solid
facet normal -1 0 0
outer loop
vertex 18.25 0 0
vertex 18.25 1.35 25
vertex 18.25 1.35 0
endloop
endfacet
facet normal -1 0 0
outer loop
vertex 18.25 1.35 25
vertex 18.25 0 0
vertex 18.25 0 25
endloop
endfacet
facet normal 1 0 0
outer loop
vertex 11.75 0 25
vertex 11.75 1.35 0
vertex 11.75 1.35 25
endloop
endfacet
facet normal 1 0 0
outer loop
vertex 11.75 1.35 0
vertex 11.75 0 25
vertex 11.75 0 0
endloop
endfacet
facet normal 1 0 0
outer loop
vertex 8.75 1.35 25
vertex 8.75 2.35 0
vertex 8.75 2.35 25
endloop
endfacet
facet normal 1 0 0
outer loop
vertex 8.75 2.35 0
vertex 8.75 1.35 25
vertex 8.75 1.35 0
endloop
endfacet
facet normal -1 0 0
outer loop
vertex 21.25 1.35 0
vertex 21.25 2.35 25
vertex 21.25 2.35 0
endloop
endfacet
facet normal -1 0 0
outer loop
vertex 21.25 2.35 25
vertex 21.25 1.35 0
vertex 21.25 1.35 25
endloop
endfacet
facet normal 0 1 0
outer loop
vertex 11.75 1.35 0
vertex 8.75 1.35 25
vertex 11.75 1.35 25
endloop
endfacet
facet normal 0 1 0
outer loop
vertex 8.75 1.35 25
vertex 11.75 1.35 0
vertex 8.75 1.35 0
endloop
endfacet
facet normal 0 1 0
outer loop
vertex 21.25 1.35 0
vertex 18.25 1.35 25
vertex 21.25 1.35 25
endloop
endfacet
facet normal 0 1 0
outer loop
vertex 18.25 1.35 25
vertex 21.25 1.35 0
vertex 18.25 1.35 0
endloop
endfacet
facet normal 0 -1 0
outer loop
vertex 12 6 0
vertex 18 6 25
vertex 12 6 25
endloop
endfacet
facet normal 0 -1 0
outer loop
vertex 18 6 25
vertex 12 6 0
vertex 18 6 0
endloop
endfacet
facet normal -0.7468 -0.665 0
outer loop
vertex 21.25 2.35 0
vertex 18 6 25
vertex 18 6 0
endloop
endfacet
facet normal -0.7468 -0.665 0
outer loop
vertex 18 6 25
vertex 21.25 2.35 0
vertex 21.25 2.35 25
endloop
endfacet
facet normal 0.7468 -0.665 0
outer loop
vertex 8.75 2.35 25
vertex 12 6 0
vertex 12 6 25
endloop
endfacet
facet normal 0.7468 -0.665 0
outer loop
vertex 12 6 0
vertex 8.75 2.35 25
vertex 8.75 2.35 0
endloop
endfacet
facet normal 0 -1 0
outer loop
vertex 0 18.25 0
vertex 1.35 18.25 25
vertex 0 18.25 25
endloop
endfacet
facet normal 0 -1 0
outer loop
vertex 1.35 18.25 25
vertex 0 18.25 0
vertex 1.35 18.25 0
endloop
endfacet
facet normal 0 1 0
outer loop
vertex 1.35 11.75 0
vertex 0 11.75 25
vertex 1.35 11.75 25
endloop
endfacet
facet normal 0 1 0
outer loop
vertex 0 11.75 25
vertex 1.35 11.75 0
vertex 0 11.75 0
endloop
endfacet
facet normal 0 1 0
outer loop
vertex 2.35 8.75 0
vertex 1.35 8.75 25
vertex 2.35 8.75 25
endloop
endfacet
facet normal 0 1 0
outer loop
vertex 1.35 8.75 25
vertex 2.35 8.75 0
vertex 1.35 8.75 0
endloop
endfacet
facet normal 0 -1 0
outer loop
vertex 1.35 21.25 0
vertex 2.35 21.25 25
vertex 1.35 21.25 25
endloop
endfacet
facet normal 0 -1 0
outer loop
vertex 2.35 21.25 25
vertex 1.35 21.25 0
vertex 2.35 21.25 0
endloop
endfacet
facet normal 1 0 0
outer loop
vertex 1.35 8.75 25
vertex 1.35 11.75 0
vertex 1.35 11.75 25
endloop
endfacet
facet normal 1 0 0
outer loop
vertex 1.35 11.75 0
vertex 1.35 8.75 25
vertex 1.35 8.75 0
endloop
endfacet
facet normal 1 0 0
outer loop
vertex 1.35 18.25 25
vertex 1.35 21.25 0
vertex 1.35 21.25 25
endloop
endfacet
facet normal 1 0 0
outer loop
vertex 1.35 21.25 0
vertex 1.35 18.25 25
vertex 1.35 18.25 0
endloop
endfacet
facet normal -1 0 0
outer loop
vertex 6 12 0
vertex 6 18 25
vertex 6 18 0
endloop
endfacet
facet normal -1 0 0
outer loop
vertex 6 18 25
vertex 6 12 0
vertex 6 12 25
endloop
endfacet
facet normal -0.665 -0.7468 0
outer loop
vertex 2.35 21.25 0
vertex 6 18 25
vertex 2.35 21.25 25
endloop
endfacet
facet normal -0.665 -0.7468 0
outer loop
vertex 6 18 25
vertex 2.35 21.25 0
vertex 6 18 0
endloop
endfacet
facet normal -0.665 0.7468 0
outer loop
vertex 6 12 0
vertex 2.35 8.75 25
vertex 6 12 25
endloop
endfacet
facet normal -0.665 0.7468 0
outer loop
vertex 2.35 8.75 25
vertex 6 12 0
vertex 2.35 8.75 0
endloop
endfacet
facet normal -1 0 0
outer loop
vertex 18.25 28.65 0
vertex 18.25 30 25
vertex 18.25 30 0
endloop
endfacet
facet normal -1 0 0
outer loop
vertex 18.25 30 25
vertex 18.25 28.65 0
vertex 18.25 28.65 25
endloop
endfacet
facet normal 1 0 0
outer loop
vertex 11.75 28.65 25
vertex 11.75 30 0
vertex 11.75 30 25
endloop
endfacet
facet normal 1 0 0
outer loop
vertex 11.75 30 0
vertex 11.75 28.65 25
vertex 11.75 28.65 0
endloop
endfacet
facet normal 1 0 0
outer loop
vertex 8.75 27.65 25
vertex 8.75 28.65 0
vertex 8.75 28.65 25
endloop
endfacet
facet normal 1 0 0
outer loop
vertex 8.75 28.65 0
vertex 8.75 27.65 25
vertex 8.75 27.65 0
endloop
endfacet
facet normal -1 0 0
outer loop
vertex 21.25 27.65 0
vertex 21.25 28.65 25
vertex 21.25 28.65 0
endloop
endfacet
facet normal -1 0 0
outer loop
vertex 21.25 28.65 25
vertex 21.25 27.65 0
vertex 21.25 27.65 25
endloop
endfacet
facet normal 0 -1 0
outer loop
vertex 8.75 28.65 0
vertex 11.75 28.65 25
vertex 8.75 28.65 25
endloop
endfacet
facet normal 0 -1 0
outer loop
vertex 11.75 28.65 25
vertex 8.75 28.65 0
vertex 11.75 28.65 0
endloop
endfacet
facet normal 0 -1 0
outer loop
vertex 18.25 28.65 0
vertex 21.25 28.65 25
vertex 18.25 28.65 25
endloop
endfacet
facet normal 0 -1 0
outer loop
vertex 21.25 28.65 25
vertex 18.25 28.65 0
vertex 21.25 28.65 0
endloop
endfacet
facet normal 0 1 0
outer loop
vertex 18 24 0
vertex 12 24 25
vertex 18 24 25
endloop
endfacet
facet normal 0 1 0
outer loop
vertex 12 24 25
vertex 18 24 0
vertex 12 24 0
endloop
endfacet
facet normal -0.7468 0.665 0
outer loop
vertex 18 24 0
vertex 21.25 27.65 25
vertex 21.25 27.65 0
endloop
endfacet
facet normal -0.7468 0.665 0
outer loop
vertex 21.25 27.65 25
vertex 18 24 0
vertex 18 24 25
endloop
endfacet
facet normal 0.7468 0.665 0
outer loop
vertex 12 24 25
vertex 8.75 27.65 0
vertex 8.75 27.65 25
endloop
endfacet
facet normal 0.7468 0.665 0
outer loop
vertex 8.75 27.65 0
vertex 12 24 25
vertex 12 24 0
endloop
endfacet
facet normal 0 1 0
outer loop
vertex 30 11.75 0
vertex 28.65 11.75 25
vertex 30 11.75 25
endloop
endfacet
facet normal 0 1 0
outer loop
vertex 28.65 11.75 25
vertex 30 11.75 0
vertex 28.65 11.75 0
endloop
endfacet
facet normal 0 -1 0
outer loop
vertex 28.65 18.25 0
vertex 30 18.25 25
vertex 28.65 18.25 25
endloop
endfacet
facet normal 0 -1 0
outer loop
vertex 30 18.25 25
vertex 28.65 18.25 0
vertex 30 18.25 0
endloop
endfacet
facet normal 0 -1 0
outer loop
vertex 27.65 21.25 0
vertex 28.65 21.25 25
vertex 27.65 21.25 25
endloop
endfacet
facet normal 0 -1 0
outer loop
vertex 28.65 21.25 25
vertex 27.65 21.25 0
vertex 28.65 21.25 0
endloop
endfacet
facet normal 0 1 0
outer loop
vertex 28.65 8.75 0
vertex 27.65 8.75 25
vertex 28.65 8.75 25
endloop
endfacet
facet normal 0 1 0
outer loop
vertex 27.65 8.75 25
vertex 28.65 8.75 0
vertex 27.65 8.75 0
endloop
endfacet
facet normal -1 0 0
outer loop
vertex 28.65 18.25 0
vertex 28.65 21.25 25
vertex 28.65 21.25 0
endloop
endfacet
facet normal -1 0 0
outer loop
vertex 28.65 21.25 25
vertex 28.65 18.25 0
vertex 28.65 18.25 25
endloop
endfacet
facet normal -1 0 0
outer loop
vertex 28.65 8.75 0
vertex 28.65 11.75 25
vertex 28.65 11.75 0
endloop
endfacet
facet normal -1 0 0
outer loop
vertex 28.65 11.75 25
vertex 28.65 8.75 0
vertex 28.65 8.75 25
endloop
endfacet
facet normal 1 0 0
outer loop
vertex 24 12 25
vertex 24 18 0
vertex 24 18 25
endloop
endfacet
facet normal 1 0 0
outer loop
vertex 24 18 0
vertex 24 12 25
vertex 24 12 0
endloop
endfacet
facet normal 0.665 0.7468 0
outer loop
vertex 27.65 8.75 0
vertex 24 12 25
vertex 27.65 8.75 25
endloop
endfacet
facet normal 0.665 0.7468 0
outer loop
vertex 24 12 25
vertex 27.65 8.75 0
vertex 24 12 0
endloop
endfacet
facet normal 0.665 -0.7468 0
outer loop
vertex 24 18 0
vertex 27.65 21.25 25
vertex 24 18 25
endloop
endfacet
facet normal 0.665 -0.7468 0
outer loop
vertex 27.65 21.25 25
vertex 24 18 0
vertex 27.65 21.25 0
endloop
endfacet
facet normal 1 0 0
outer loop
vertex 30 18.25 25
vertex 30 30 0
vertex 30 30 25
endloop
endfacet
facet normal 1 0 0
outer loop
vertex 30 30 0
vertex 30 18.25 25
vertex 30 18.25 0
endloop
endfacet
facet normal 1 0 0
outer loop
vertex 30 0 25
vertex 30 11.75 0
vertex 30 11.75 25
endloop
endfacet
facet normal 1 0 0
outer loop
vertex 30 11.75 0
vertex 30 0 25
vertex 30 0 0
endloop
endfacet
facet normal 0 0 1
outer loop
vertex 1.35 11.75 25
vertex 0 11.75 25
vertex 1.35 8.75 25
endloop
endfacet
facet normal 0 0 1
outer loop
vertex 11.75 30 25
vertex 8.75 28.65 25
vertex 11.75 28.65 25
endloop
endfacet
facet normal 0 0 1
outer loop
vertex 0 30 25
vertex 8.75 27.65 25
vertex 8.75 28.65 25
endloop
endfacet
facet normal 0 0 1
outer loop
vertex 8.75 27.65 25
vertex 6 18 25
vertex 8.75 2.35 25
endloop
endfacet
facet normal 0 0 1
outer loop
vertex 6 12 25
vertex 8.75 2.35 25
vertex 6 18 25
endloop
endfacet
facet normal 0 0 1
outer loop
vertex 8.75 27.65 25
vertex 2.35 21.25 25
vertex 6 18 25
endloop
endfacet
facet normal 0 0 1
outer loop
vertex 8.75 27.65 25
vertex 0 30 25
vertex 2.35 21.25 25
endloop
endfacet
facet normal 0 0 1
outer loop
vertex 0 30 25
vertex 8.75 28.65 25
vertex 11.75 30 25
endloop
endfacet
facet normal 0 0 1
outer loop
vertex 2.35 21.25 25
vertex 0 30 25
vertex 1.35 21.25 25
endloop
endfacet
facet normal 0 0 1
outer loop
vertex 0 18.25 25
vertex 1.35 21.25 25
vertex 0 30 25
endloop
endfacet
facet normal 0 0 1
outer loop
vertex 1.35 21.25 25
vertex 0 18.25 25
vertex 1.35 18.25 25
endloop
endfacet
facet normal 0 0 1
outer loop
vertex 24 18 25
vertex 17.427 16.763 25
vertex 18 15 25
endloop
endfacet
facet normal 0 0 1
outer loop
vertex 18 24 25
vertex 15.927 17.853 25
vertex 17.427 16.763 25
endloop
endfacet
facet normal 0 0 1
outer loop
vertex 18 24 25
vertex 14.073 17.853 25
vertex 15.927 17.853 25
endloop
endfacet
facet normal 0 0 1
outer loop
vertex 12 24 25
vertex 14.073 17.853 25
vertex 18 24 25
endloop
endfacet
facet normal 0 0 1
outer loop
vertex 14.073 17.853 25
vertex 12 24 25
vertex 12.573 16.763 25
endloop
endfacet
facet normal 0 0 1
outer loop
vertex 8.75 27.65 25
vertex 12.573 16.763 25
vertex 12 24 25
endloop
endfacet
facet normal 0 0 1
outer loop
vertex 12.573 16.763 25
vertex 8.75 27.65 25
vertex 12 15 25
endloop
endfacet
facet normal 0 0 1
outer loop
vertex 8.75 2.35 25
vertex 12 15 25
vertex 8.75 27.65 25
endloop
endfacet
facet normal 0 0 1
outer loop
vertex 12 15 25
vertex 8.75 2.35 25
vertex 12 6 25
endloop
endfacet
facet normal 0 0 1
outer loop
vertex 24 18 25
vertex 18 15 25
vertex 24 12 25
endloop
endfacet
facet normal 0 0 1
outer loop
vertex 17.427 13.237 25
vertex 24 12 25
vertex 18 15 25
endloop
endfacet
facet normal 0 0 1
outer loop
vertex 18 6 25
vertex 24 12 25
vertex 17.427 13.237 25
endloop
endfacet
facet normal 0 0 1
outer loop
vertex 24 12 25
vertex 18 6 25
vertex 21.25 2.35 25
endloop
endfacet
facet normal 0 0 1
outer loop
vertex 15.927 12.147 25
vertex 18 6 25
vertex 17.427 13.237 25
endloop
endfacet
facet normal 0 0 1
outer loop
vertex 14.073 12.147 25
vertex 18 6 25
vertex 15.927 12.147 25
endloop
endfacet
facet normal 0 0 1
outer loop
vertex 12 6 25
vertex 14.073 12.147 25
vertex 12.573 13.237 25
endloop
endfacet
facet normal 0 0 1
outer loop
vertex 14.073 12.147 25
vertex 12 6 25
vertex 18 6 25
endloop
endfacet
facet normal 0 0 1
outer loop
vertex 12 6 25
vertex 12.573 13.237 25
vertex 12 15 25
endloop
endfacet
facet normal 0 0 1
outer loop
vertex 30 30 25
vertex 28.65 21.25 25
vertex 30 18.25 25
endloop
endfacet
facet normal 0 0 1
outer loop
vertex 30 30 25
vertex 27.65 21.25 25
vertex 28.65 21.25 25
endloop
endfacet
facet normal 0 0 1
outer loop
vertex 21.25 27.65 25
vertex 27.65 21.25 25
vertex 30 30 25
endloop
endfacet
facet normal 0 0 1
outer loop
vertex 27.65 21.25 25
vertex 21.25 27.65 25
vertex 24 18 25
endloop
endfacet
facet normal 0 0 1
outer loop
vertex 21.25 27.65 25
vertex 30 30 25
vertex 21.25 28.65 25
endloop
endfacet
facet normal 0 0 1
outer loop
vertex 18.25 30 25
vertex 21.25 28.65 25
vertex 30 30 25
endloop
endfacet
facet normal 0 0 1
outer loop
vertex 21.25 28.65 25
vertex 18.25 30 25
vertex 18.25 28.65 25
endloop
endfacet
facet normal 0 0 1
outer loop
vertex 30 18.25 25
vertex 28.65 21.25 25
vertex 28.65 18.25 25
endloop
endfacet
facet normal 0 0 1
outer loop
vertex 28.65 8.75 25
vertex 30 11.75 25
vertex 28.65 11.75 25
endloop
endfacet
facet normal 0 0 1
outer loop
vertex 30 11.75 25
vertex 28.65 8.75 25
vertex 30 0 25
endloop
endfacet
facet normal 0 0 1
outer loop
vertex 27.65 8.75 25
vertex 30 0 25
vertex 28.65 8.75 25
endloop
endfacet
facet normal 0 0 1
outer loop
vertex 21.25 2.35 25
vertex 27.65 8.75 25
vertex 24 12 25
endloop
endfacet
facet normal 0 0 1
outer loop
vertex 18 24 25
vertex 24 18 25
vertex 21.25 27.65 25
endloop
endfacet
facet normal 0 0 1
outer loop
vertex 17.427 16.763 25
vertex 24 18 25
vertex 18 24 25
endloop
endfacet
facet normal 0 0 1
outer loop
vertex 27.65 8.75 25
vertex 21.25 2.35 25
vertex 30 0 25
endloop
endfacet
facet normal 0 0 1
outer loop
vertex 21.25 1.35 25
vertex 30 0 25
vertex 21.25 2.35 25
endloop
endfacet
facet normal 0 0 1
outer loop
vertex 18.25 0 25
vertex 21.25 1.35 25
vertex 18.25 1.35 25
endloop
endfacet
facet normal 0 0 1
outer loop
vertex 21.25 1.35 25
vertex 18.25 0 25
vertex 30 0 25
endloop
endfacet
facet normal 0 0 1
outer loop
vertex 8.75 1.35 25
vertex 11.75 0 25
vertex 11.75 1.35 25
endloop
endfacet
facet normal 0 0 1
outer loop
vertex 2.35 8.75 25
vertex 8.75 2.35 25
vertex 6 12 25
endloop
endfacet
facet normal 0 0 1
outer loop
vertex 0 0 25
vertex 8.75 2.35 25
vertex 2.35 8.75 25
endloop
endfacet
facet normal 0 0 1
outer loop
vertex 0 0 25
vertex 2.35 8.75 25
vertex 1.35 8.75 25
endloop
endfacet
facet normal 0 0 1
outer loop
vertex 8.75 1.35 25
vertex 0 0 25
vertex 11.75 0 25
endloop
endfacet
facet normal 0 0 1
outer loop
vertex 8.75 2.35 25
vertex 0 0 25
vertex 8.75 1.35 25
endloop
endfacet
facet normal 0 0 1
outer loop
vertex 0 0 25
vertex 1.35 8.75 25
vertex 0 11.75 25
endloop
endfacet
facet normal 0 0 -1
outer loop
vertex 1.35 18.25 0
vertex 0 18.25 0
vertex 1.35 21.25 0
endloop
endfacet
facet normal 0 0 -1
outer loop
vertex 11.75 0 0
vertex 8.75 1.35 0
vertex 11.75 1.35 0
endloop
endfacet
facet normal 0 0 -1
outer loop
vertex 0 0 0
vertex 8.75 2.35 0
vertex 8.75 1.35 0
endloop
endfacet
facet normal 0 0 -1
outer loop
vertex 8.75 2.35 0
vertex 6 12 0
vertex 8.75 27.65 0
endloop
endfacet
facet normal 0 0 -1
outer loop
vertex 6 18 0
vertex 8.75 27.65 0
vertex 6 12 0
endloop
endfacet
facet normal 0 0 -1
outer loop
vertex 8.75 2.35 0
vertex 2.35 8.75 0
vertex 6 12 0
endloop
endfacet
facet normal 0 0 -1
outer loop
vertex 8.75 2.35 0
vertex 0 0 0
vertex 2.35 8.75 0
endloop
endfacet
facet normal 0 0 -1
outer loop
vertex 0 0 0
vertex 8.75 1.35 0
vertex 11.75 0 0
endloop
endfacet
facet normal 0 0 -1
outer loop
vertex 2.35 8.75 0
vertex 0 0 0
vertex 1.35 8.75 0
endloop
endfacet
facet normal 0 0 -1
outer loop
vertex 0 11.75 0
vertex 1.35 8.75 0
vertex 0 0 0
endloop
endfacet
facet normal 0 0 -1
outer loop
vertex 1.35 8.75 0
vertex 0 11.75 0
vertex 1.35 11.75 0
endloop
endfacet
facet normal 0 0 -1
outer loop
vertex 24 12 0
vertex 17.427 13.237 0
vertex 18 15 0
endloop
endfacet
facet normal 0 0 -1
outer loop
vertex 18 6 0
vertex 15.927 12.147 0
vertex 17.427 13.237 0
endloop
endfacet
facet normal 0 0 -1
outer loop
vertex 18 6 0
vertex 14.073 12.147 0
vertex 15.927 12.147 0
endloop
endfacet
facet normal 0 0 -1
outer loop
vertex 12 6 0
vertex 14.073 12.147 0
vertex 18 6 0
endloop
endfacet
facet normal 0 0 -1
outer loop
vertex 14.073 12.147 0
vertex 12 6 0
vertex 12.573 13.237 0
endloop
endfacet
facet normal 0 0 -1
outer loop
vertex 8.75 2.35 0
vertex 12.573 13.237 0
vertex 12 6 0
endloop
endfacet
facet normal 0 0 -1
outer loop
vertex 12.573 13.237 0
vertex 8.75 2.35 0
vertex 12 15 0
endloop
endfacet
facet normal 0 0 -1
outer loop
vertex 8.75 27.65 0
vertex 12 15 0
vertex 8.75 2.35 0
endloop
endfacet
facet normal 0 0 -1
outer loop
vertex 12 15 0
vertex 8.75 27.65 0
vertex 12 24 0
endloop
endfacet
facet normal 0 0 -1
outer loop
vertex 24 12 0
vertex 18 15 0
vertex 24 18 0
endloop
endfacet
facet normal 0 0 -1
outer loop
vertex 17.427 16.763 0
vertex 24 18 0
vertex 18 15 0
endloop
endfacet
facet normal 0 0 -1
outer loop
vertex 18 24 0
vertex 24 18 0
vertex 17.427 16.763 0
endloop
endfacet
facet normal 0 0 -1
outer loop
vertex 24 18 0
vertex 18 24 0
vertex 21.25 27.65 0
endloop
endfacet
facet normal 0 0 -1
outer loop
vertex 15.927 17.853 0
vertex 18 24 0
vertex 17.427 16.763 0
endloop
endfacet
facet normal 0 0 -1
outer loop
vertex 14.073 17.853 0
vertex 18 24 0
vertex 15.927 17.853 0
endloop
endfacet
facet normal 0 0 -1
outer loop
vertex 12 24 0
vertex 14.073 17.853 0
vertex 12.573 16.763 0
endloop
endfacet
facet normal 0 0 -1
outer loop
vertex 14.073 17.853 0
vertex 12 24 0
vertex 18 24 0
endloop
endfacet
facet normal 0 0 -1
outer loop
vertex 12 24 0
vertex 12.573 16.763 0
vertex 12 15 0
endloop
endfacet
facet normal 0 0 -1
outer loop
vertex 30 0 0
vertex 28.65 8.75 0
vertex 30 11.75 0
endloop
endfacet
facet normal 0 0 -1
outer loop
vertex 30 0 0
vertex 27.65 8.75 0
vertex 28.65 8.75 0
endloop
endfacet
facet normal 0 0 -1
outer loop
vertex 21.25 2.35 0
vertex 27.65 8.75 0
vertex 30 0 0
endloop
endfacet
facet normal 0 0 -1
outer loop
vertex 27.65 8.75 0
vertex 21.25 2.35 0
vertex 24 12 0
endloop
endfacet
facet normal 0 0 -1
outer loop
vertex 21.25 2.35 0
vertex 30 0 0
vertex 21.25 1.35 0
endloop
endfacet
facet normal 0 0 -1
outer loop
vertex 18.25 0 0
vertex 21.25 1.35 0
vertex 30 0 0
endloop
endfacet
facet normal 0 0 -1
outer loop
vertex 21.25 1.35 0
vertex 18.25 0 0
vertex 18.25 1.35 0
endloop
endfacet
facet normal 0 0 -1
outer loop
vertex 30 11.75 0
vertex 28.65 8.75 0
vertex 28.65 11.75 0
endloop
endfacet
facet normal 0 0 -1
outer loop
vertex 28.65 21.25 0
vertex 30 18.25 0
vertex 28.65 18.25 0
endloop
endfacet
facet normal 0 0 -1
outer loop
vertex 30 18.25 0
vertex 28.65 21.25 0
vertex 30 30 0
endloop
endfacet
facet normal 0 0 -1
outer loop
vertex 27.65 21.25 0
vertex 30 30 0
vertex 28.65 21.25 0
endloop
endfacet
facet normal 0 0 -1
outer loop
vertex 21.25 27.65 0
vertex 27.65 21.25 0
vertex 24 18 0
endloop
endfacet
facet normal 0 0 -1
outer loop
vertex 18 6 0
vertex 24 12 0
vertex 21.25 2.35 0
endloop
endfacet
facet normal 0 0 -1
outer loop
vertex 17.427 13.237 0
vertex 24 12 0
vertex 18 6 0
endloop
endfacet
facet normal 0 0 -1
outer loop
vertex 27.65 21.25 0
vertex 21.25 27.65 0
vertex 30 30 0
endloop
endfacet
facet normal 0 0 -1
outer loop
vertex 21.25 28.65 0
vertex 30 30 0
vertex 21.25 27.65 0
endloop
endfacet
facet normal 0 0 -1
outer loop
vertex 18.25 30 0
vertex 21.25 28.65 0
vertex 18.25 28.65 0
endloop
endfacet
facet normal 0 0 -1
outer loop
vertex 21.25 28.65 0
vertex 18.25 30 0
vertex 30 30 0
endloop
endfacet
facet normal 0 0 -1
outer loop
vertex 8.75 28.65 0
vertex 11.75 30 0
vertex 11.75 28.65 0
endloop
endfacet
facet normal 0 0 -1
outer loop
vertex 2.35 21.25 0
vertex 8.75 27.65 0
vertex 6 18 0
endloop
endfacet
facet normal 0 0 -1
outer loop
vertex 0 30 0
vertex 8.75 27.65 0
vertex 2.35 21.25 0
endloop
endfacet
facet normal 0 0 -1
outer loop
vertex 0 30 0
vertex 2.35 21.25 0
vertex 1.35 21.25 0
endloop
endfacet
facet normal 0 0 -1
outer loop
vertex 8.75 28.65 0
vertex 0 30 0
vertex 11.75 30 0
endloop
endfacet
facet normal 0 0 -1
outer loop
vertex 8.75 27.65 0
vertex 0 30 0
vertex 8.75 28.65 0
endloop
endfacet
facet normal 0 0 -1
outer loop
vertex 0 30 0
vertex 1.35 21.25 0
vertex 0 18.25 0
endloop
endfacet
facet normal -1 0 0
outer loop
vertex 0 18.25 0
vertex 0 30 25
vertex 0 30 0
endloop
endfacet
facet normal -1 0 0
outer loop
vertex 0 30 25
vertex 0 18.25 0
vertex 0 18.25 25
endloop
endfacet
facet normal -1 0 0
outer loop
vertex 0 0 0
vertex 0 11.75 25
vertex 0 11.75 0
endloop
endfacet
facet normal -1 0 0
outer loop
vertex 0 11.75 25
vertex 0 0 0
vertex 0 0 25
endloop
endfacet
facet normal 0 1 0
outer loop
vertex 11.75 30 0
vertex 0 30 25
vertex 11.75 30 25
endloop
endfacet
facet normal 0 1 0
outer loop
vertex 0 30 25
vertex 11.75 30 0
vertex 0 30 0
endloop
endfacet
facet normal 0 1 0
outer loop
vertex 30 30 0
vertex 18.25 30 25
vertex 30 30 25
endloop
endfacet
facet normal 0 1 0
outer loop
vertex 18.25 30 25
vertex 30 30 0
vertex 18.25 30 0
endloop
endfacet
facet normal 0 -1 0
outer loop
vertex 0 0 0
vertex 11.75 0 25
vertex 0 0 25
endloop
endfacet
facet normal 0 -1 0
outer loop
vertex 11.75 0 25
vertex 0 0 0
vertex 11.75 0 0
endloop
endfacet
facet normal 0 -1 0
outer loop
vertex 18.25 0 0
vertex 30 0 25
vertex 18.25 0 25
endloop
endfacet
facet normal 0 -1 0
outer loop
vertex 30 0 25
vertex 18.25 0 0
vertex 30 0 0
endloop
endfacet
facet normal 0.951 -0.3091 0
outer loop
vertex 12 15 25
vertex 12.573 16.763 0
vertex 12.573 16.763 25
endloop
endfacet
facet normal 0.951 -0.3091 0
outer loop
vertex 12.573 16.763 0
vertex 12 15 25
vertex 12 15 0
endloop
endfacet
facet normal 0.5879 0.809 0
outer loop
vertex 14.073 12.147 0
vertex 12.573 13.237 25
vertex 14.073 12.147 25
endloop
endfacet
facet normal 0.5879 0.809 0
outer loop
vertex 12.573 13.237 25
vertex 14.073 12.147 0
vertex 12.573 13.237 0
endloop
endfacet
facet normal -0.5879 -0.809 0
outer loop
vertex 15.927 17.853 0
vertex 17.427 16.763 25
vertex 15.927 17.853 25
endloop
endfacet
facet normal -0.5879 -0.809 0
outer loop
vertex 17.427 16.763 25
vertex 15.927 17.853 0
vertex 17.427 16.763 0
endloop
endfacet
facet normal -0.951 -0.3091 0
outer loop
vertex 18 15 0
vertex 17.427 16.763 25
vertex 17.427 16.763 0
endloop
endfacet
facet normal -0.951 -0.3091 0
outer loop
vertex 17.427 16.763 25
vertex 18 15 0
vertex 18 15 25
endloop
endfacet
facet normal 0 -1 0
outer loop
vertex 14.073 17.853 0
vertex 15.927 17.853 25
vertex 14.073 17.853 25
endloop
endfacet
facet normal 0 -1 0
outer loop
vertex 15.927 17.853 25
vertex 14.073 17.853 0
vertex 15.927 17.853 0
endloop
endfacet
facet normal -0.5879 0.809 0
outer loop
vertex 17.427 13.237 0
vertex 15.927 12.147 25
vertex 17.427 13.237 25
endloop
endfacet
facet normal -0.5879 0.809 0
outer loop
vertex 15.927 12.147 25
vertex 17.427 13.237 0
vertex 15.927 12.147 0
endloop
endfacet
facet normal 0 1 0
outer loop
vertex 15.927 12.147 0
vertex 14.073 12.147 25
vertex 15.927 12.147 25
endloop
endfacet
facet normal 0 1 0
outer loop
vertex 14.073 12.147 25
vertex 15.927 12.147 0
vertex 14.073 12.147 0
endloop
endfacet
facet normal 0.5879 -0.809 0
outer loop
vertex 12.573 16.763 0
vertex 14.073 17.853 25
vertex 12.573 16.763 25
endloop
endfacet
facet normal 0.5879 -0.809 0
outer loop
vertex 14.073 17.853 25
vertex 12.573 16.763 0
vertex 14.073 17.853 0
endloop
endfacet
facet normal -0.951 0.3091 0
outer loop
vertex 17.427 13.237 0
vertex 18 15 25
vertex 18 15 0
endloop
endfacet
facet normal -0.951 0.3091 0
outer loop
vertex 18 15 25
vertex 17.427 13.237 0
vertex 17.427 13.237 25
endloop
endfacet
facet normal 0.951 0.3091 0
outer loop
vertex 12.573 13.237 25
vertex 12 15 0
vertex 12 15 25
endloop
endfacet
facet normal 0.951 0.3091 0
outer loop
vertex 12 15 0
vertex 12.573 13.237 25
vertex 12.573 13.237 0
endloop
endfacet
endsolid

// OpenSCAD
//Specify the height
Height = 25 ; // [1:1:500]
//Specify the inner diameter
InnerDiameter = 6 ; // [5:1:8]

3030_Profile ();
module 3030_Profile() {
    color ("silver")
    difference () {
        translate ([0,0,0]) cube ([30,30,Height]);
        translate ([15,15,-1]) cylinder(d=InnerDiameter,h=+Height+2);

        3030_ProfileCutOut (Height=Height);
        mirror ([1,0,0]) rotate ([0,0,90]) 3030_ProfileCutOut (Height=Height);
        translate ([0,30,0]) mirror ([0,1,0]) 3030_ProfileCutOut (Height=Height);
        translate ([30,30,0]) rotate ([0,0,-90]) mirror ([0,1,0]) 3030_ProfileCutOut (Height=Height);

    }
}
module 3030_ProfileCutOut () {    
    color ("silver")
    union () {
        translate ([15-3.25,-0.5,-1]) cube ([6.5,6,Height+2]);
        hull () {
            translate ([15-6.25,1.35,-1]) cube ([12.5,1,Height+2]);
            translate ([15-3,5,-1]) cube ([6,1,Height+2]);
        }
    }
}
